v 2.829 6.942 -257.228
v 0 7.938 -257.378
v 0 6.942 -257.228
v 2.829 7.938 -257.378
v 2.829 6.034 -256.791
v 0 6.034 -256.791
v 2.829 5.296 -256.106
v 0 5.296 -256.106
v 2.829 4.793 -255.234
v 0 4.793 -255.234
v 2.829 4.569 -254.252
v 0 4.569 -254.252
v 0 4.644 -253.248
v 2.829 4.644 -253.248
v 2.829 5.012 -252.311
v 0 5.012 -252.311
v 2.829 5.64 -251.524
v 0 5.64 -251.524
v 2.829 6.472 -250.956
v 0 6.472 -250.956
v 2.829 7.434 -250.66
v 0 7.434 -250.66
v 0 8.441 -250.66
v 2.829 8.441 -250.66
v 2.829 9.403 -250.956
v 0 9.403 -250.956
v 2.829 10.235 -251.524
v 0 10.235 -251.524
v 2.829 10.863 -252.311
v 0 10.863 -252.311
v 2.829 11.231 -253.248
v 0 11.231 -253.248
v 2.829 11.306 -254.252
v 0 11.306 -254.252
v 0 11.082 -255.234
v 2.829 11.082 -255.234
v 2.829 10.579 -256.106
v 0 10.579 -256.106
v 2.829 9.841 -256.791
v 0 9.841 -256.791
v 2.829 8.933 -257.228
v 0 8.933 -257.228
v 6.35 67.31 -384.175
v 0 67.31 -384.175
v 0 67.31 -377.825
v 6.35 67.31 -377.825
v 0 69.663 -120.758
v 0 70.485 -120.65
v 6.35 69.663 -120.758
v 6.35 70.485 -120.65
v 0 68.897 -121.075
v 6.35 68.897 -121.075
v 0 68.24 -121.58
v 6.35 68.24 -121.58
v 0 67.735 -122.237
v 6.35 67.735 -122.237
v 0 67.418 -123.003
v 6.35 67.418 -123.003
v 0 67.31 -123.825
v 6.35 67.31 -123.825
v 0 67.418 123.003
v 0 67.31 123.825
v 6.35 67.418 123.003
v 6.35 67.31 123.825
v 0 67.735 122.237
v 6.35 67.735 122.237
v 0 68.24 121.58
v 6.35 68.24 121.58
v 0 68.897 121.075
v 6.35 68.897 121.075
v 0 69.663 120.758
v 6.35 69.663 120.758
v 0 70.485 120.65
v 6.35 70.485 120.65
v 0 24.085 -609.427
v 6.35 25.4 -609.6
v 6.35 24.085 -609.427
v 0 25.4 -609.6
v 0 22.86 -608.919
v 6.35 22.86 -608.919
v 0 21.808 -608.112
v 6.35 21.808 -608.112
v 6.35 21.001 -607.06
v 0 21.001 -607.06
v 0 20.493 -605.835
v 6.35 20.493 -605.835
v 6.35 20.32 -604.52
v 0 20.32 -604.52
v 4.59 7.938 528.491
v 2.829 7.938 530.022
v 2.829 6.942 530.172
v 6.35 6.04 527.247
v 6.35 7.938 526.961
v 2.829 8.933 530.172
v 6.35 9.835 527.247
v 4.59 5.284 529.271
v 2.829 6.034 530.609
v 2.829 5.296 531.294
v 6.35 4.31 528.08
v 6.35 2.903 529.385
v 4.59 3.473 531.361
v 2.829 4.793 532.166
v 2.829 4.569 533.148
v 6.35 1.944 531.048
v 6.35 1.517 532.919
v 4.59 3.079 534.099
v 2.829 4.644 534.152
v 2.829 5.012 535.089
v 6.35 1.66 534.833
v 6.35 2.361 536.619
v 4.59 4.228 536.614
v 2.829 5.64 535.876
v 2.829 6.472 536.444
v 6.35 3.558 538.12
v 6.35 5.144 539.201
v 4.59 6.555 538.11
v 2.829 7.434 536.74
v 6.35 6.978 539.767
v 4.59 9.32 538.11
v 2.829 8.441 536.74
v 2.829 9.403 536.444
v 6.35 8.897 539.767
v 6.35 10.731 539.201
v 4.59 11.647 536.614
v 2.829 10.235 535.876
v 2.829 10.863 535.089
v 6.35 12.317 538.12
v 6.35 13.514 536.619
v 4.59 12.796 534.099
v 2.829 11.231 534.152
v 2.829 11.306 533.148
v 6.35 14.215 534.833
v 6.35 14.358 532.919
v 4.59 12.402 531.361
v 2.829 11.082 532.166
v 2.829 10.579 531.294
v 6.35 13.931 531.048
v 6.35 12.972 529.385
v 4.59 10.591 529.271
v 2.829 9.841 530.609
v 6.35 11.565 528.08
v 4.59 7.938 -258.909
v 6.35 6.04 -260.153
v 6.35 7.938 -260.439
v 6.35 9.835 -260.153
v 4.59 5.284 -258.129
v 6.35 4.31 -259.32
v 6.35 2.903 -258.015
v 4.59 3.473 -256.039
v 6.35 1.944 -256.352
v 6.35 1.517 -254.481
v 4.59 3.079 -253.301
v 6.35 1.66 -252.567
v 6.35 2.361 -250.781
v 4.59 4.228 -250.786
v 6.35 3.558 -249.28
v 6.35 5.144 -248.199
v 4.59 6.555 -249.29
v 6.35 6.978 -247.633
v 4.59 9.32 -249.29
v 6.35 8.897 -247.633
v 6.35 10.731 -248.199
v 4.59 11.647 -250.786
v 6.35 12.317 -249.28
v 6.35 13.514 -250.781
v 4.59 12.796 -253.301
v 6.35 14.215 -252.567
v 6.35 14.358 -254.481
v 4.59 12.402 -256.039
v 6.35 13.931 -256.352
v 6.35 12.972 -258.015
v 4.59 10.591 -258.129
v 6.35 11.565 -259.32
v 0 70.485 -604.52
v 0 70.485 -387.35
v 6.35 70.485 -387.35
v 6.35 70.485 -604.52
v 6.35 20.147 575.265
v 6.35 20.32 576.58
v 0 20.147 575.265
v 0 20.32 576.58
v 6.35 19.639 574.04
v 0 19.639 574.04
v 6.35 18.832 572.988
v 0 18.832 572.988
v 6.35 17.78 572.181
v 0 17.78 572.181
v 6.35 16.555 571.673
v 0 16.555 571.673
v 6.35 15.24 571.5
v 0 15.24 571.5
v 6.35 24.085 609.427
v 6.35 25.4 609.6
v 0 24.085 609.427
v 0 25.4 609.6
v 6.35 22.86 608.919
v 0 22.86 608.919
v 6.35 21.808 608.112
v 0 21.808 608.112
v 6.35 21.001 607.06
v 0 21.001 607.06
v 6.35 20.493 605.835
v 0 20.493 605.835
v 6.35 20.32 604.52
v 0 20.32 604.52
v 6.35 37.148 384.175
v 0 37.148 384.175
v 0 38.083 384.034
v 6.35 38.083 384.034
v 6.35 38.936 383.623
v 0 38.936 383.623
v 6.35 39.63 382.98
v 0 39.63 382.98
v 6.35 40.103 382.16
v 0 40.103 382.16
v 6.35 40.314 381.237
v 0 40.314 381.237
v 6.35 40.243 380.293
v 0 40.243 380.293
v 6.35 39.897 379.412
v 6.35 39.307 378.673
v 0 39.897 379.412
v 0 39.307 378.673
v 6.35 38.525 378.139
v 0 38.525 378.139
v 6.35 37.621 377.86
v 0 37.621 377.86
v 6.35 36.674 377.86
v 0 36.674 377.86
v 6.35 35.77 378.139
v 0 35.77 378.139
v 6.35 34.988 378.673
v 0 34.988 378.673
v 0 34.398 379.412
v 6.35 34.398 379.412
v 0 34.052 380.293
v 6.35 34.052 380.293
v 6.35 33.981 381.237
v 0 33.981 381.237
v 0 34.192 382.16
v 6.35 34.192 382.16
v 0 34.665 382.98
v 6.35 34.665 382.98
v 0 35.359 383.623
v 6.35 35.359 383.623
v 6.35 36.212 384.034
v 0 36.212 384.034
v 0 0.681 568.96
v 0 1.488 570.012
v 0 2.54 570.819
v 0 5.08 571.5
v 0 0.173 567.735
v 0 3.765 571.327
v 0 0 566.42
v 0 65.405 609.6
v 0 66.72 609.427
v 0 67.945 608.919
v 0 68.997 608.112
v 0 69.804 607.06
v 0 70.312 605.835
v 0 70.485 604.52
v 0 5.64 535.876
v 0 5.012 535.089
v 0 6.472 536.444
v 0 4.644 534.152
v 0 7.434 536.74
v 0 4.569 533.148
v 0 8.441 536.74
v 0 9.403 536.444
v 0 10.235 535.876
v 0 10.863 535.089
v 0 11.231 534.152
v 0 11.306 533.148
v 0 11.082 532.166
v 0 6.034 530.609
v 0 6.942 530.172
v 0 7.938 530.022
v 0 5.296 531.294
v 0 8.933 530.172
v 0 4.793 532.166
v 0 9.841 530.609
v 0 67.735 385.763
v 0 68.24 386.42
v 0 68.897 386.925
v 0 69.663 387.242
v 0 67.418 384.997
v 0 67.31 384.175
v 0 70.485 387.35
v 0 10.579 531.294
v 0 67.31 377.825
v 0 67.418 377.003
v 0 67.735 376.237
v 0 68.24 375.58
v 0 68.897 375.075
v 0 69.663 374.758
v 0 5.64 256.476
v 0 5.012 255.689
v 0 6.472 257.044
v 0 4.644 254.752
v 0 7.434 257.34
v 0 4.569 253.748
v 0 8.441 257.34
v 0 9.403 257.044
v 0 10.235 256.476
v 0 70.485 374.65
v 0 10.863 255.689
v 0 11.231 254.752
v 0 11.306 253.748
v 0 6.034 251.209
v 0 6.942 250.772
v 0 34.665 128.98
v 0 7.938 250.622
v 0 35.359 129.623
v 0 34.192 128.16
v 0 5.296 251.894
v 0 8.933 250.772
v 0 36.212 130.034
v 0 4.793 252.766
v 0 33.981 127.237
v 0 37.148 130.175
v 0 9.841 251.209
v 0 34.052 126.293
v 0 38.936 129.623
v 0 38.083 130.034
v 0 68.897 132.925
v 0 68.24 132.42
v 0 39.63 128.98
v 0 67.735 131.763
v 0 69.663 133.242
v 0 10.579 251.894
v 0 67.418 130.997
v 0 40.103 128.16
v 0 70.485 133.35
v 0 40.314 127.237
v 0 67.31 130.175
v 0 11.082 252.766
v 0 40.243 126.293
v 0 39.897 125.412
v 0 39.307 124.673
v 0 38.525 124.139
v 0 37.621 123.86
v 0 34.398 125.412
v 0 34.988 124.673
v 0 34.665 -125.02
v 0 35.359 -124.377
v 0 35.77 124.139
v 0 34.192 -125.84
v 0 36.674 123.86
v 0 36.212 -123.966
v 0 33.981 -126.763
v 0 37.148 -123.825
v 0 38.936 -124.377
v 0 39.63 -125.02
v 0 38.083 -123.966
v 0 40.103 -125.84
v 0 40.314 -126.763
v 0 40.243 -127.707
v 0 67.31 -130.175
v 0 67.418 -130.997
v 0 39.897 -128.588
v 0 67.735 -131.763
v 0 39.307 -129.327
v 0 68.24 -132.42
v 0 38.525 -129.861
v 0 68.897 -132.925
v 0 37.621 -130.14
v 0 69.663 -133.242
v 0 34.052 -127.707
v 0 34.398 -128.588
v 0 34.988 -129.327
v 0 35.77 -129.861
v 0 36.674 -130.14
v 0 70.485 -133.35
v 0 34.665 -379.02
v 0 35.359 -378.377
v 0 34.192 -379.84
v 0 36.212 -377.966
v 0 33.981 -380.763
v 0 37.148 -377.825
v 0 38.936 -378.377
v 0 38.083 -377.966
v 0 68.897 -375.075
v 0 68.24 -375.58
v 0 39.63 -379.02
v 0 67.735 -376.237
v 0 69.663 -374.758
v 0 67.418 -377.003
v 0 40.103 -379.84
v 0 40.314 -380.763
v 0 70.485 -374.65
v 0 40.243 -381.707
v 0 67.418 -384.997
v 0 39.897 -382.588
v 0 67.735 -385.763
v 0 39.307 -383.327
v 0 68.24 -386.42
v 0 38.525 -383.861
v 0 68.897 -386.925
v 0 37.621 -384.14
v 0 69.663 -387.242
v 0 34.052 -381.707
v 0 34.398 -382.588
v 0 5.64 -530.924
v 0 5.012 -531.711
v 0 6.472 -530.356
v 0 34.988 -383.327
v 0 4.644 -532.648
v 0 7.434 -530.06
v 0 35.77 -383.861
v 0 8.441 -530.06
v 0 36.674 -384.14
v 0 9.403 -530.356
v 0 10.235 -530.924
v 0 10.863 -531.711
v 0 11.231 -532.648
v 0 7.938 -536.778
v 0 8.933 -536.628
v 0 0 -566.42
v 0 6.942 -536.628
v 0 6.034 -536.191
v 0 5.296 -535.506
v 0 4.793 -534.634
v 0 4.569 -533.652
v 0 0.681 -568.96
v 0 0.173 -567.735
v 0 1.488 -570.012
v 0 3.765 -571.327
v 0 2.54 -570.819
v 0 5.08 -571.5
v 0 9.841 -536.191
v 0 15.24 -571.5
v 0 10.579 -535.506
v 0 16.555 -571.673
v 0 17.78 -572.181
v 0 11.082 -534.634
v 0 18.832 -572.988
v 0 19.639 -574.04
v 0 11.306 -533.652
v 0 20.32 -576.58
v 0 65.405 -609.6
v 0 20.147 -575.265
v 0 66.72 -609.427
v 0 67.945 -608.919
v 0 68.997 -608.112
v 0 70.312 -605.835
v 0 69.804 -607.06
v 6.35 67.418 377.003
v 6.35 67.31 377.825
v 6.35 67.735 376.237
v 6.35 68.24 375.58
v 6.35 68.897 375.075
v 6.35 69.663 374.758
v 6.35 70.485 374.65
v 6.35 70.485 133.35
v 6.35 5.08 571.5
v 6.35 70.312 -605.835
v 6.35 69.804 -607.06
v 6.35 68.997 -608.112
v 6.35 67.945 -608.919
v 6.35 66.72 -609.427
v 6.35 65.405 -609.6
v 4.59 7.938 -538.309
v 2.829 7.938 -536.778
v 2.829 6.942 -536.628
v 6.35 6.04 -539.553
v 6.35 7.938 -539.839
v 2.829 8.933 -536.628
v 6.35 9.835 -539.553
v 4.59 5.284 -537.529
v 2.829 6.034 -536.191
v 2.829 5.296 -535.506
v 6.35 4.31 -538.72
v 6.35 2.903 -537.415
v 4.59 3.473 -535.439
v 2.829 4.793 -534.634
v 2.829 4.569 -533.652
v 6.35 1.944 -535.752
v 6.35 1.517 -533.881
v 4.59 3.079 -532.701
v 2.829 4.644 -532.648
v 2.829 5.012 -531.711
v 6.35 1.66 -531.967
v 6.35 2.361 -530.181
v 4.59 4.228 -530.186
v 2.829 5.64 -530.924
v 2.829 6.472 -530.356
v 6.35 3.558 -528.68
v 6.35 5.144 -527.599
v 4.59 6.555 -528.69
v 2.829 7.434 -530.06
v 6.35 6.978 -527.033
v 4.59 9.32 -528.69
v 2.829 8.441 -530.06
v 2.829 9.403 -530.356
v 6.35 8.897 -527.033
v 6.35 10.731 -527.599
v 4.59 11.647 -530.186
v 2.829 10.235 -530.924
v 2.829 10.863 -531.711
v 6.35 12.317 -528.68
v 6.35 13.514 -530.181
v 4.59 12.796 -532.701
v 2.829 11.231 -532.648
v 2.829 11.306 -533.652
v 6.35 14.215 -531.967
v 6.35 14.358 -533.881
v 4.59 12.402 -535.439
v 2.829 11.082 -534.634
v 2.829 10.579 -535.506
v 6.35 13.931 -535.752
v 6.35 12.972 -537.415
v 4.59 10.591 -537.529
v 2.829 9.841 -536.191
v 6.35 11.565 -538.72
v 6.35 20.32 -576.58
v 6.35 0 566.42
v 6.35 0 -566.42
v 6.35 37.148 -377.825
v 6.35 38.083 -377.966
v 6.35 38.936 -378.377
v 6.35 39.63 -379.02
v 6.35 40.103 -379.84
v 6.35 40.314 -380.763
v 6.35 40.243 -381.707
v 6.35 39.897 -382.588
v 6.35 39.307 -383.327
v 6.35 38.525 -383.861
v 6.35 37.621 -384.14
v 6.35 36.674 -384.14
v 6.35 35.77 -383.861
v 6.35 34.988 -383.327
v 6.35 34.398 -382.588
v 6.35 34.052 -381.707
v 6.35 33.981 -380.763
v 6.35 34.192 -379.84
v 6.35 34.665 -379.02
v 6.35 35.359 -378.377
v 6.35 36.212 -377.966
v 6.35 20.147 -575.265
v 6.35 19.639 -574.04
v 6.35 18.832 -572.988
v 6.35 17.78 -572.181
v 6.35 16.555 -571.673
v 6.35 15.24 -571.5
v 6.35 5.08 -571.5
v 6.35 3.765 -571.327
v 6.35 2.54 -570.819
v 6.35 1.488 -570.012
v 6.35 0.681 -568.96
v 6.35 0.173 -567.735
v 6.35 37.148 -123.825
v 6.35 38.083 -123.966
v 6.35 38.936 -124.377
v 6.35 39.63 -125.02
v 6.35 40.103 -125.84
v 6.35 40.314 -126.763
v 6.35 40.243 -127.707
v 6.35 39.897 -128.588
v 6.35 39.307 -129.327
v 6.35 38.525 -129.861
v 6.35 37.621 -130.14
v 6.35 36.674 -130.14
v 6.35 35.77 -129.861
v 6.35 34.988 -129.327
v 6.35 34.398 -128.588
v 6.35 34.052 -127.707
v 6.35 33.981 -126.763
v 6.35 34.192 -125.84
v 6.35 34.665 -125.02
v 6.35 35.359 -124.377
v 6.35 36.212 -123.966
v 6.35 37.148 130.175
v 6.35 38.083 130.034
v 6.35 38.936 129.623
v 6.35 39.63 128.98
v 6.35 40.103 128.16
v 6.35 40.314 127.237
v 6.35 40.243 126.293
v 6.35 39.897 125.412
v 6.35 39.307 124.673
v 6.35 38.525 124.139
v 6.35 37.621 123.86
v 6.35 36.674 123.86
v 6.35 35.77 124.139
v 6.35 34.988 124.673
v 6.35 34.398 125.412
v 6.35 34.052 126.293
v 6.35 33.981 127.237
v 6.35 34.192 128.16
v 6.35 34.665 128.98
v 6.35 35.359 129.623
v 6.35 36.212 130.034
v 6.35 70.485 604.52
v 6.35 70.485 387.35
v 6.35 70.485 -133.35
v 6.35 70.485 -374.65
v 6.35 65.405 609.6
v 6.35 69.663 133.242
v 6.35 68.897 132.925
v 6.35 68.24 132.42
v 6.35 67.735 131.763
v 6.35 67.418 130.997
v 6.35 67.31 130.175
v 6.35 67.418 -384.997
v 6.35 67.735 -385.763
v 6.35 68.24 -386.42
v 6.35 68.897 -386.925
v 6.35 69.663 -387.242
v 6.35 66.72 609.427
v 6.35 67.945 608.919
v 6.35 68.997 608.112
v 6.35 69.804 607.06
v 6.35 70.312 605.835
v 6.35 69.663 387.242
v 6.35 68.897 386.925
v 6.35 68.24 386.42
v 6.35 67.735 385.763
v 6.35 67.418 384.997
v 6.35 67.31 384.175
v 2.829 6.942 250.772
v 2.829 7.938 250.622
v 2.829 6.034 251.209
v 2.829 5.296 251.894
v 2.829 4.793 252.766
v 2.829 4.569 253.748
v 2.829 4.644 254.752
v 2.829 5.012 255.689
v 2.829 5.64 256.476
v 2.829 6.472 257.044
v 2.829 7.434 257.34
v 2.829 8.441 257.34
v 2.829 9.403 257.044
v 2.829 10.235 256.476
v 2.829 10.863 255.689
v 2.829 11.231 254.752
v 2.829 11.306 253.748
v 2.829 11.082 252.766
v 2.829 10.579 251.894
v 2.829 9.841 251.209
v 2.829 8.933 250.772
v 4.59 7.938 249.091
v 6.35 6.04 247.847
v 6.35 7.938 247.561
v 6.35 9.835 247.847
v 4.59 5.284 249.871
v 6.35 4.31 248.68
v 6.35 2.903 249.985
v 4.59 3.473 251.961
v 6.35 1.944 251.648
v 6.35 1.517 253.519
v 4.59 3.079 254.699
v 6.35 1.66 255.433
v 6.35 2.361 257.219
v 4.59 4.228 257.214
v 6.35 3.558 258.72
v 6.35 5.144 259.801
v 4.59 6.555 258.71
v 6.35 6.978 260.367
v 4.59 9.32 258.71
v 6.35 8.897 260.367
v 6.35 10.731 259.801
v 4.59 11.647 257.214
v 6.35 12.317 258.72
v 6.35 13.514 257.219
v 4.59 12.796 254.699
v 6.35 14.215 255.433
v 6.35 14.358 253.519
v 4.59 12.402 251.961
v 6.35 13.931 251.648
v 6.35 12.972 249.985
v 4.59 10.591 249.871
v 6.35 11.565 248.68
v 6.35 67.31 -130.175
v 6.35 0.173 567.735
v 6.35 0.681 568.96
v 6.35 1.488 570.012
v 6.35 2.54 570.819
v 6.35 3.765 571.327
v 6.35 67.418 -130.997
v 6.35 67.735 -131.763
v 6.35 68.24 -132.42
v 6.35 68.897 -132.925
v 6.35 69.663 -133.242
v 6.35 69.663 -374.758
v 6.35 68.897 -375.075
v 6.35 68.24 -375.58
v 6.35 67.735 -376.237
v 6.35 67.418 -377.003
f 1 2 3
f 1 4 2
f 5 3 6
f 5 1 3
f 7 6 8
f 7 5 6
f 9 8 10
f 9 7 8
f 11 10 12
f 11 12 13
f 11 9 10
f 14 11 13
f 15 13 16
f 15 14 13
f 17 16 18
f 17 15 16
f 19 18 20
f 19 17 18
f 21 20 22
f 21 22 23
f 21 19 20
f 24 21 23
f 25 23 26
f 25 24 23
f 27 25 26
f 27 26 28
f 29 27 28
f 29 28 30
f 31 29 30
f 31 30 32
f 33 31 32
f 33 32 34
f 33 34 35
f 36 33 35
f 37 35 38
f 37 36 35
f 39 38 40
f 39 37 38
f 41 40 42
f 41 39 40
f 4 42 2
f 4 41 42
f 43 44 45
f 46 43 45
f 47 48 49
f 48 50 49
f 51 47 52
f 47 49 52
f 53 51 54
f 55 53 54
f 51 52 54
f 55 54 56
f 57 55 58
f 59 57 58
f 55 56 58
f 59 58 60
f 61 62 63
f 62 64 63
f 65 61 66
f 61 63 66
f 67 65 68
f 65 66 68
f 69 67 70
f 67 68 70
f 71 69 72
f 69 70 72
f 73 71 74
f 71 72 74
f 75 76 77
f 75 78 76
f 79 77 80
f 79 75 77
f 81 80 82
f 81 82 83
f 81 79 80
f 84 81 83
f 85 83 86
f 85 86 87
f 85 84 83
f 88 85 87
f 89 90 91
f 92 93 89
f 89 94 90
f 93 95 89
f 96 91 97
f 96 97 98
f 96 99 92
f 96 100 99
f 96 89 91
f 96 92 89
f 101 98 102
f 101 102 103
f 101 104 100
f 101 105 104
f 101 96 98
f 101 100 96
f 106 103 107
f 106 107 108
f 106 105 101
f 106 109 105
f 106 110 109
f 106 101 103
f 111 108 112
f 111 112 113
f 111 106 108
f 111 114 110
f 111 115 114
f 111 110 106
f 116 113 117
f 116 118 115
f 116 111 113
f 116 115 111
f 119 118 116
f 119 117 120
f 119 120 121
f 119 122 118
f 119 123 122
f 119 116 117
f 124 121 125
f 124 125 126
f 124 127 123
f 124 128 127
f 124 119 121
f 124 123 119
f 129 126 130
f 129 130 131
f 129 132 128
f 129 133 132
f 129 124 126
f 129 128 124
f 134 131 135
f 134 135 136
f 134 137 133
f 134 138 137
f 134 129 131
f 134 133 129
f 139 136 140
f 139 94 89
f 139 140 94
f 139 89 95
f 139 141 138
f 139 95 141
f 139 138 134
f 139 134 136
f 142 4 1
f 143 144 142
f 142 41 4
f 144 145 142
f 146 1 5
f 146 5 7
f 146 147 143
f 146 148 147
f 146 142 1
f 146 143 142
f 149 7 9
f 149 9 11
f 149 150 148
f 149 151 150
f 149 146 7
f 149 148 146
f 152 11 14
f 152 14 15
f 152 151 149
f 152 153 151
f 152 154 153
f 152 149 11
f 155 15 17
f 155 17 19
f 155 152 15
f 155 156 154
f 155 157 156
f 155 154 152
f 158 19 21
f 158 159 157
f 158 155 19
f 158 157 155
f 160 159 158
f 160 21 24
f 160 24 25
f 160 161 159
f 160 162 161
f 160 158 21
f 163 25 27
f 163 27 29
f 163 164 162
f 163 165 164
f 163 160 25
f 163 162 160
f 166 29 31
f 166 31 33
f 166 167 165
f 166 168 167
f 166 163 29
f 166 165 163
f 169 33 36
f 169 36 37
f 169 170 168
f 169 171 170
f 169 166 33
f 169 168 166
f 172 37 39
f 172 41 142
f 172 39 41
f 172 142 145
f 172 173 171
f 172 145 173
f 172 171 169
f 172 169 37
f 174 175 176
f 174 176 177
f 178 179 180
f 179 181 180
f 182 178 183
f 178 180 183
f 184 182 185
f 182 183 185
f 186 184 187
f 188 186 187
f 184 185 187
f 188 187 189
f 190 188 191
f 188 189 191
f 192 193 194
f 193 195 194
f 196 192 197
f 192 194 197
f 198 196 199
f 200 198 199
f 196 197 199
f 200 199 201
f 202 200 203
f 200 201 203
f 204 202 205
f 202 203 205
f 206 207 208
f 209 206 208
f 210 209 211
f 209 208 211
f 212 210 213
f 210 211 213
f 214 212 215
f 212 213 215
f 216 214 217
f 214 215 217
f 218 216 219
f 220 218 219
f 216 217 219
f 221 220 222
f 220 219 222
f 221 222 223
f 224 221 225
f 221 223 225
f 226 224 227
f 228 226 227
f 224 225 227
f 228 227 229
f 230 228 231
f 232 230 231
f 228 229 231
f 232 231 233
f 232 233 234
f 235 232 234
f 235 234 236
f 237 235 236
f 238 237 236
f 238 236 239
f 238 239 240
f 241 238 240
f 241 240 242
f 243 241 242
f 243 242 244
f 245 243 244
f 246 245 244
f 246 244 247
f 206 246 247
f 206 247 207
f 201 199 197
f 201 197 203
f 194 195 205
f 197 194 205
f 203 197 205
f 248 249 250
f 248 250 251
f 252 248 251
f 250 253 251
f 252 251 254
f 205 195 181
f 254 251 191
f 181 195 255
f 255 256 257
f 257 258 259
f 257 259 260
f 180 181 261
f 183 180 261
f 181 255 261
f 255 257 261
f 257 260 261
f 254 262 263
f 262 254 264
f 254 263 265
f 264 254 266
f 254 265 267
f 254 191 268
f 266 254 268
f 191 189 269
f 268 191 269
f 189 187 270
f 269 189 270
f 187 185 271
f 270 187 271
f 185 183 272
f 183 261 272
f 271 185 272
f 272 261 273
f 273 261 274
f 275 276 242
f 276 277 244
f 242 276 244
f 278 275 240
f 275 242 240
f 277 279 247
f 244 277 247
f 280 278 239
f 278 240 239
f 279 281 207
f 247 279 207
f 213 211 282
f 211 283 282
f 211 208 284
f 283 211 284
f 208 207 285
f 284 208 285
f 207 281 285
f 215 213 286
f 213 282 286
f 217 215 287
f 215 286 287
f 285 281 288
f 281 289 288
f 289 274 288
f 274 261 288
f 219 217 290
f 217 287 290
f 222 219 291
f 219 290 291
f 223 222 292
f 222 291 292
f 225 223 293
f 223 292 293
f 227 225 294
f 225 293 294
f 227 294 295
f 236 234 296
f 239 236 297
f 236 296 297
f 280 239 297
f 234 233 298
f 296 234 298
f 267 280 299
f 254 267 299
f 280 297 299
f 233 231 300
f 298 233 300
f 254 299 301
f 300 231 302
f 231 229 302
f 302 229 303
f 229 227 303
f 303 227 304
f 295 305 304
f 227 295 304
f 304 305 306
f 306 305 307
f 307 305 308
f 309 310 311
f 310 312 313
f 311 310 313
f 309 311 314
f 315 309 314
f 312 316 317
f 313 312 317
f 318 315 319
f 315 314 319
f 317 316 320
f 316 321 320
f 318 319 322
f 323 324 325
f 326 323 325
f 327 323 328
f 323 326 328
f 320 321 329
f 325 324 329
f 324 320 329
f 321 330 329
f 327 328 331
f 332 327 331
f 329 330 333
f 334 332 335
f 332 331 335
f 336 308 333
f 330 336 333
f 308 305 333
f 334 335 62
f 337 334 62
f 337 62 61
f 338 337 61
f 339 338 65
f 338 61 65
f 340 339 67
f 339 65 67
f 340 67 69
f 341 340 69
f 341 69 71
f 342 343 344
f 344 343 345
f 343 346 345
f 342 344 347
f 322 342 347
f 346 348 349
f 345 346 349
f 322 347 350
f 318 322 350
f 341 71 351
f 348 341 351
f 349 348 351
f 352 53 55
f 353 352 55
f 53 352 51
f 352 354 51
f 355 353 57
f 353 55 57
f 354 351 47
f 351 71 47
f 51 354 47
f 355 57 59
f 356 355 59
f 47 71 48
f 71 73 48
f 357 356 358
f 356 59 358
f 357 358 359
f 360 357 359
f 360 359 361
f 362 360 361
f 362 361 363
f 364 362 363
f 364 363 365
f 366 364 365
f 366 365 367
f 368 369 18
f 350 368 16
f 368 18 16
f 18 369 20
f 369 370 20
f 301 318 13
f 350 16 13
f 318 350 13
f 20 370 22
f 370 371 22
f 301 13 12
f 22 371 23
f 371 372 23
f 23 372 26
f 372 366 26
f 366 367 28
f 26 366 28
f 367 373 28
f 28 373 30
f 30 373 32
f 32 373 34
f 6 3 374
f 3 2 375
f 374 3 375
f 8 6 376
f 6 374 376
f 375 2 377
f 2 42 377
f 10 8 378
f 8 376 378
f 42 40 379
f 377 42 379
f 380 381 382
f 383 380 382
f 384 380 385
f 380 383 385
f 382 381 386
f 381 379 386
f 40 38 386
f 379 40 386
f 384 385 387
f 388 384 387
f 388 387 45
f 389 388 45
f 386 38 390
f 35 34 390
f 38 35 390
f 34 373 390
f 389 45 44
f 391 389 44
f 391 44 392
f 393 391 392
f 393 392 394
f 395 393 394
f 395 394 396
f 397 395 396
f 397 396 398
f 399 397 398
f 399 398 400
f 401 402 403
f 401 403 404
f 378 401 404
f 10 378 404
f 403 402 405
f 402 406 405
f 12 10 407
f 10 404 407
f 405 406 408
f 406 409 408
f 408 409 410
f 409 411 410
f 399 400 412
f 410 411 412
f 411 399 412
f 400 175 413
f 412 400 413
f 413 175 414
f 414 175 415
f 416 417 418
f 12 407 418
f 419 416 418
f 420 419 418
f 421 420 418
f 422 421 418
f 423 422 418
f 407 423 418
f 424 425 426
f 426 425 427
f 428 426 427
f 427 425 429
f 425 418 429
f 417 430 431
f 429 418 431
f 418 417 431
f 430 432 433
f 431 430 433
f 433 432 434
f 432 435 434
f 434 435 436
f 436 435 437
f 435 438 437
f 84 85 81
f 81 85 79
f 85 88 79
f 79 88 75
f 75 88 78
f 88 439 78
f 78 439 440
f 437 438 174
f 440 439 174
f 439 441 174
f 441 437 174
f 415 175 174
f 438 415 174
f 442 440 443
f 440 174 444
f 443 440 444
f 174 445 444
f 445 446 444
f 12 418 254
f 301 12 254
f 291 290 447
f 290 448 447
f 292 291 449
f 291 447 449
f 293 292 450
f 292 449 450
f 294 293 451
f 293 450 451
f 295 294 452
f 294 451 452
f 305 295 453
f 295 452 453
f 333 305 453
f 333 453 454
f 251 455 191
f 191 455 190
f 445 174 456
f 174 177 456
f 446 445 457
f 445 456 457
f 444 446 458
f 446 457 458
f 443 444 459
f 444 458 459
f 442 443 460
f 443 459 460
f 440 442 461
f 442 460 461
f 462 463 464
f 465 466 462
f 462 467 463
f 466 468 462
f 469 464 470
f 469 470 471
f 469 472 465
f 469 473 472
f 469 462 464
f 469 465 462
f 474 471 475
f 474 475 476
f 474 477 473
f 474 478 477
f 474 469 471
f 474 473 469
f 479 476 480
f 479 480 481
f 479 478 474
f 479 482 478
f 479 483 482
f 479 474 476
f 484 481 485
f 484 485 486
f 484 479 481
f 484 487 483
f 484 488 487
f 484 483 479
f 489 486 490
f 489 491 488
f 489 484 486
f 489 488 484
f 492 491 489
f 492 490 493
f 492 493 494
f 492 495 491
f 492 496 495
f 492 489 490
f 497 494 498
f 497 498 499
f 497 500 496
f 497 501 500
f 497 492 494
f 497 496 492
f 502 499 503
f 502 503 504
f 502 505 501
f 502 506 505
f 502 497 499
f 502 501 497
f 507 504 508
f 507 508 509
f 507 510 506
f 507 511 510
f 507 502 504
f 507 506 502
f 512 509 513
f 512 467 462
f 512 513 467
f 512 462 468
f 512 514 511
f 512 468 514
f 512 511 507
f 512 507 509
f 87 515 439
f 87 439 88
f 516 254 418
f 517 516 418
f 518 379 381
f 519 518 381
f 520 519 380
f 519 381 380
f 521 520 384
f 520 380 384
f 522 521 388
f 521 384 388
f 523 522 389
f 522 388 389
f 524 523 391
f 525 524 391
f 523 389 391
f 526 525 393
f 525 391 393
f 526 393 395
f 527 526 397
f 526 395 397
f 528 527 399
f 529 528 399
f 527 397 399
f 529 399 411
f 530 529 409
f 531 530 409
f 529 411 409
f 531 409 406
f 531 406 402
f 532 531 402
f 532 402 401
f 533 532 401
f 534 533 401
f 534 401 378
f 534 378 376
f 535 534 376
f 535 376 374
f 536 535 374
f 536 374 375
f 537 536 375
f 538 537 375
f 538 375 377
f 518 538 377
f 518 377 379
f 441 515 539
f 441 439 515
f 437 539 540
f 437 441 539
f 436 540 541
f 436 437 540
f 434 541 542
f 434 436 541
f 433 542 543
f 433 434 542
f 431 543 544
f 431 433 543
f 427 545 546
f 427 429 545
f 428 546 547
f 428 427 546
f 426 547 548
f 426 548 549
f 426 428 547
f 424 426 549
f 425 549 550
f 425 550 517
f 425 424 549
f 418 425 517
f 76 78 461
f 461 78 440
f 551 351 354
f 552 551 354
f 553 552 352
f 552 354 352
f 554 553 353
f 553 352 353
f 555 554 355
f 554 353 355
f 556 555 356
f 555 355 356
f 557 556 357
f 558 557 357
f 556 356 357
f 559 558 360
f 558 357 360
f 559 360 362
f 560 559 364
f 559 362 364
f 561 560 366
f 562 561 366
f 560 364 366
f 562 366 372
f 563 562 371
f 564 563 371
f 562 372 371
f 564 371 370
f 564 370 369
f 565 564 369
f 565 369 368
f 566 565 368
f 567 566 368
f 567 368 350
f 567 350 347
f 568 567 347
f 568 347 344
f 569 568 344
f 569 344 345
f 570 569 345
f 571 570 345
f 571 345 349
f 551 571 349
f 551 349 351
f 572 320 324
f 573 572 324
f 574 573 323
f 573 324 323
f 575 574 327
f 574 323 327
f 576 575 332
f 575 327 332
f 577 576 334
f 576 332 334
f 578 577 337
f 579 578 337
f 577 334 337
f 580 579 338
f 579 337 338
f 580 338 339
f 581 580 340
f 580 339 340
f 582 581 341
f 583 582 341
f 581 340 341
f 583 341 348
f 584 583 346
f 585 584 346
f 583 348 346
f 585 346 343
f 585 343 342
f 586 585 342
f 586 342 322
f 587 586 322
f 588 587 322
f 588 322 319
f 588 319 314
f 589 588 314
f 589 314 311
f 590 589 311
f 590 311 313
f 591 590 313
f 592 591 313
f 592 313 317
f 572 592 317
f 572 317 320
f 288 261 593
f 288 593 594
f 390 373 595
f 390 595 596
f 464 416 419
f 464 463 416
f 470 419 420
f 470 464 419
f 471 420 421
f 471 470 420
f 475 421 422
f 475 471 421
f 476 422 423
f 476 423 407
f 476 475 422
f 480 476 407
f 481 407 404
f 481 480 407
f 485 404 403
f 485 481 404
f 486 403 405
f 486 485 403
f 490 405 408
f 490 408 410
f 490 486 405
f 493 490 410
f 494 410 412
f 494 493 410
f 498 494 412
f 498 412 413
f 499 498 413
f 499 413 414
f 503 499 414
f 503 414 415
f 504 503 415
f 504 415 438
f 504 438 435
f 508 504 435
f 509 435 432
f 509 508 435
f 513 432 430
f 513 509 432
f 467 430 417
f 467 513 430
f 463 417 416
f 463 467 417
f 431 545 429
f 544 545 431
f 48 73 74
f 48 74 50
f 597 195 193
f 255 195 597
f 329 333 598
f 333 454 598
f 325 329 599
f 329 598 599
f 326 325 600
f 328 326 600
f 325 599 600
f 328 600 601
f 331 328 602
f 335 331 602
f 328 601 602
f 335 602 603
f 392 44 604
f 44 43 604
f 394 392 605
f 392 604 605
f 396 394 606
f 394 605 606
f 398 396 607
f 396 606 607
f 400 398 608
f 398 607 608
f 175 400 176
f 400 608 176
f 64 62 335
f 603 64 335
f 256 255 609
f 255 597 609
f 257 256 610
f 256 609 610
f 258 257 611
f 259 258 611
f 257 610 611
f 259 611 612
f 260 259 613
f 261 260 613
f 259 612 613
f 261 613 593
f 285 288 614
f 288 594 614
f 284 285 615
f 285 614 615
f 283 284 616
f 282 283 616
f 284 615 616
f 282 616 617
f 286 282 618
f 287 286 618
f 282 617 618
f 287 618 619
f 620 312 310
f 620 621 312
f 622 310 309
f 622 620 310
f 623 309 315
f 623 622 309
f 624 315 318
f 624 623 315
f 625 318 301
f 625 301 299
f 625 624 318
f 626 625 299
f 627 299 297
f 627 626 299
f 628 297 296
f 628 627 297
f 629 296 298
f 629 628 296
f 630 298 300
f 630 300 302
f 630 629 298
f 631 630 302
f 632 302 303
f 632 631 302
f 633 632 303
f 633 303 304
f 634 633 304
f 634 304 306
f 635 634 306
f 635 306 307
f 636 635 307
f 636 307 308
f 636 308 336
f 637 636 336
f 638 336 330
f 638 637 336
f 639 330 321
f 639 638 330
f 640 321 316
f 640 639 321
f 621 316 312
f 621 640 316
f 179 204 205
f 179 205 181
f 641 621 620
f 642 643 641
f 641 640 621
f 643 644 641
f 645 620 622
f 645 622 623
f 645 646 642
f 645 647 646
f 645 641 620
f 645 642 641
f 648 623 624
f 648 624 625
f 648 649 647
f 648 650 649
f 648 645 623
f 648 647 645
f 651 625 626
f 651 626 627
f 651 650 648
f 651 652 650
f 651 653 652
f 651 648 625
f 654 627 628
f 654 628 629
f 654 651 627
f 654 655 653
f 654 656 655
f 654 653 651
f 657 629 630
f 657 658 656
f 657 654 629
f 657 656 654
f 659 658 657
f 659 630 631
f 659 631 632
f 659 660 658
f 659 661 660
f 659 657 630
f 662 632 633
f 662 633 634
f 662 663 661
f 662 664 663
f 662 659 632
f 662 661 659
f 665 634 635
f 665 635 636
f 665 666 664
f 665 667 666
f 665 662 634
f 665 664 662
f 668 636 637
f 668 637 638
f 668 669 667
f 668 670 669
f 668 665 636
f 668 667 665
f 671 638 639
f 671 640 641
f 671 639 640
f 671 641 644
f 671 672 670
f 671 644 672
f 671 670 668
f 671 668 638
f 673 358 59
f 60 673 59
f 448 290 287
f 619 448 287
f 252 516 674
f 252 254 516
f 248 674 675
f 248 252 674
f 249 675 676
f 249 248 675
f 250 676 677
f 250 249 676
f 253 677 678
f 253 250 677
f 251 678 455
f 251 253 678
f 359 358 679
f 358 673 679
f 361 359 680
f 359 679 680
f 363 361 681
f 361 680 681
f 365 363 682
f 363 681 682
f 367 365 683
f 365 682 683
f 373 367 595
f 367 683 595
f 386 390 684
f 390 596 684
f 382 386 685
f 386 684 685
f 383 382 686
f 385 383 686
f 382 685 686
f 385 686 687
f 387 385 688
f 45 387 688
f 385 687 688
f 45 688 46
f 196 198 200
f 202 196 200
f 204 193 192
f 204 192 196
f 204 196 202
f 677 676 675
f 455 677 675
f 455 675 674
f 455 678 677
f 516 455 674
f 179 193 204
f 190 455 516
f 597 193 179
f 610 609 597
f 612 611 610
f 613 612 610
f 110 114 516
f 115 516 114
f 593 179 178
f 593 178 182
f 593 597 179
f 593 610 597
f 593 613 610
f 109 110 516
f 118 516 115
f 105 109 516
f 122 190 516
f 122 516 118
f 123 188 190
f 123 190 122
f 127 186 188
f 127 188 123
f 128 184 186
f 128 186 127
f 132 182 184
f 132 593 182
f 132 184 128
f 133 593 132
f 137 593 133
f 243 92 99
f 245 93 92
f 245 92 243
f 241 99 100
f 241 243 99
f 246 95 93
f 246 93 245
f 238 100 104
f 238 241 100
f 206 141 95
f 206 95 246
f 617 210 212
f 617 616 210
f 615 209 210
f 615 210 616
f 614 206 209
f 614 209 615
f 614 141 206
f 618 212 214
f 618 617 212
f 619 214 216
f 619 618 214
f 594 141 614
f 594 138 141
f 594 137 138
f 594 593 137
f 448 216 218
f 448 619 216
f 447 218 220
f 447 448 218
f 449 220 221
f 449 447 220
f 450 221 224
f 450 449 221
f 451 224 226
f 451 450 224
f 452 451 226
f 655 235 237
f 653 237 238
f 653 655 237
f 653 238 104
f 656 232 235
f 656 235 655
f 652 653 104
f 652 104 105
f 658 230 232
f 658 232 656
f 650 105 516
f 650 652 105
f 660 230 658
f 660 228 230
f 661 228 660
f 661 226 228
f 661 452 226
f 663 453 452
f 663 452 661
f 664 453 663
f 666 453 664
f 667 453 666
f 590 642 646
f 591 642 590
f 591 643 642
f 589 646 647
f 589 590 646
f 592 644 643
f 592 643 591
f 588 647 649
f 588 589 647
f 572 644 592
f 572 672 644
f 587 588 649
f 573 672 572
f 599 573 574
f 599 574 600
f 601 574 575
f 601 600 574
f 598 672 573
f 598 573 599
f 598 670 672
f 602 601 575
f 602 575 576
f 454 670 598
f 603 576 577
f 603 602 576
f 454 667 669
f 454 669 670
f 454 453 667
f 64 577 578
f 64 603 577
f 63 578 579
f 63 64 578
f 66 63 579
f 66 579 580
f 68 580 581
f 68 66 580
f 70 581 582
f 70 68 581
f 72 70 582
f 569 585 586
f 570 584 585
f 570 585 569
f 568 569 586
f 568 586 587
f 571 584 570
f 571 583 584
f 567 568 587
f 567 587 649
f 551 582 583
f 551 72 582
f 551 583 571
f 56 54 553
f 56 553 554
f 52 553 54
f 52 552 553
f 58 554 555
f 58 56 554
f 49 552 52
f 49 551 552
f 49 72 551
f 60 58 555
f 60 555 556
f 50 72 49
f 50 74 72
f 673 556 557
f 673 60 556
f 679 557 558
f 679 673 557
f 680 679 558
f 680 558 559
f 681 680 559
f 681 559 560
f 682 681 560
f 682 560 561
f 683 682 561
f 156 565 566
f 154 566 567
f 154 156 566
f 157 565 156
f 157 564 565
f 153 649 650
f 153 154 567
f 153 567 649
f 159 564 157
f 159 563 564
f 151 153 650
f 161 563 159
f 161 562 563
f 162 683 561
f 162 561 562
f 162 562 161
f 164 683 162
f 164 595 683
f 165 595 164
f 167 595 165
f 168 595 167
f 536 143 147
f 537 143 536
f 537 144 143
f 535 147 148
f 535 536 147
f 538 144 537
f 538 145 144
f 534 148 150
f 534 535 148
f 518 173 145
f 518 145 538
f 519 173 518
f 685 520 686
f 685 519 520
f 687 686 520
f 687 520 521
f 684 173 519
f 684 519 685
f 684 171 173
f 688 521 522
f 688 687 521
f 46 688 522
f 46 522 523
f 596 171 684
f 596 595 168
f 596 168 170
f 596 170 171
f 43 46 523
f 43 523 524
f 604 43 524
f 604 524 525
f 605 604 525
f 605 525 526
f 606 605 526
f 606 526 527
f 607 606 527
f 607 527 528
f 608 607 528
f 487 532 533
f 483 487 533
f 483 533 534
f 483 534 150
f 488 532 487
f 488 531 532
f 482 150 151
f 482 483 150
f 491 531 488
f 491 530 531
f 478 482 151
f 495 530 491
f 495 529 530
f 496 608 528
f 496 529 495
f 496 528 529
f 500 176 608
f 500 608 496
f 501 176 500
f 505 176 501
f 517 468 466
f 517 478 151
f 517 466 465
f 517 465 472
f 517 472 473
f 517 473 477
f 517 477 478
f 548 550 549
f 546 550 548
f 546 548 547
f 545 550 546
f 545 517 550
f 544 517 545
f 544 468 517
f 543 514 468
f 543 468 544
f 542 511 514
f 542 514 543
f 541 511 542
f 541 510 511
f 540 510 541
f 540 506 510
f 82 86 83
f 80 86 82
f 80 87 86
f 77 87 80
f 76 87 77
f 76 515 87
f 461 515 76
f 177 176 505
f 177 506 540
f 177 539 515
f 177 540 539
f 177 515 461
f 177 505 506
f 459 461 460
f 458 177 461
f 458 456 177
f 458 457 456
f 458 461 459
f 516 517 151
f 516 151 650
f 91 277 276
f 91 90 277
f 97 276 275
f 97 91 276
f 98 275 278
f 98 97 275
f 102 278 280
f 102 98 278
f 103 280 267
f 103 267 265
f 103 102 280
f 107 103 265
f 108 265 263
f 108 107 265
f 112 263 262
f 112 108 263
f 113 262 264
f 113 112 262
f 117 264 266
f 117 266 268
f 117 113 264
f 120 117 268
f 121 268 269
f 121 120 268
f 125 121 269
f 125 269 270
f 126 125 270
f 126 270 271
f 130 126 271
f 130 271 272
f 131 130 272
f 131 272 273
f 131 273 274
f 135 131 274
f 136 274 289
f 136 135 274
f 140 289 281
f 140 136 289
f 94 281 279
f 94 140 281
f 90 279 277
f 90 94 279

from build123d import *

# Parameters (mm, degrees)
SKETCH1_W                                     = 1219.2
SKETCH1_H                                     = 70.485
BOSS_EXTRUDE1_DEPTH                           = 6.35
CSK_FOR_1_4_FLAT_HEAD_MACHINE_SCREW1_AT_COUNT = 2
CSK_FOR_1_4_FLAT_HEAD_MACHINE_SCREW1_AT_PITCH = 279.4
CSK_FOR_1_4_FLAT_HEAD_MACHINE_SCREW1_2_COUNT  = 2
CSK_FOR_1_4_FLAT_HEAD_MACHINE_SCREW1_2_PITCH  = 787.4
CSK_FOR_1_4_FLAT_HEAD_MACHINE_SCREW1_3_COUNT  = 2
CSK_FOR_1_4_FLAT_HEAD_MACHINE_SCREW1_3_PITCH  = 1066.8
SKETCH4_W                                     = 38.1
SKETCH4_H                                     = 20.32
CUT_EXTRUDE1_DEPTH                            = 614.694237976
FILLET1_R                                     = 5.08
F_1_4_0_25_DIAMETER_HOLE1_D                   = 6.35
SKETCH7_W                                     = 12.7
SKETCH7_H                                     = 3.175
CUT_EXTRUDE2_DEPTH                            = 614.694237976
FILLET2_R                                     = 3.175


with BuildPart() as part:
    # Sketch1 → Boss-Extrude1 (new body)
    with BuildSketch(Plane(origin=(0, 0, 0), x_dir=(0, 0, -1), z_dir=(1, 0, 0))):
        with Locations((0, 35.2425)):
            Rectangle(SKETCH1_W, SKETCH1_H)
    extrude(amount=BOSS_EXTRUDE1_DEPTH)

    # Sketch3 → CSK for 1/4 Flat Head Machine Screw1 (revolve, cut)
    with BuildSketch(Plane(origin=(6.35, 7.9375, 533.4), x_dir=(0, 0, -1), z_dir=(0, 1, 0))):
        Polygon((0, 0), (0, 6.35), (3.3782, 6.35), (3.3782, 3.520932584), (6.4389, 0), align=None)
    csk_for_1_4_flat_head_machine_screw1 = revolve(axis=Axis((12.7, 7.9375, 533.4), (-1, 0, 0)), mode=Mode.SUBTRACT)

    # CSK for 1/4 Flat Head Machine Screw1 at: CSK for 1/4 Flat Head Machine Screw1 ×2
    with Locations(*[(0, 0, -i * CSK_FOR_1_4_FLAT_HEAD_MACHINE_SCREW1_AT_PITCH) for i in range(1, CSK_FOR_1_4_FLAT_HEAD_MACHINE_SCREW1_AT_COUNT)]):
        add(csk_for_1_4_flat_head_machine_screw1, mode=Mode.SUBTRACT)

    # CSK for 1_4 Flat Head Machine Screw1 2: CSK for 1/4 Flat Head Machine Screw1 ×2
    with Locations(*[(0, 0, -i * CSK_FOR_1_4_FLAT_HEAD_MACHINE_SCREW1_2_PITCH) for i in range(1, CSK_FOR_1_4_FLAT_HEAD_MACHINE_SCREW1_2_COUNT)]):
        add(csk_for_1_4_flat_head_machine_screw1, mode=Mode.SUBTRACT)

    # CSK for 1_4 Flat Head Machine Screw1 3: CSK for 1/4 Flat Head Machine Screw1 ×2
    with Locations(*[(0, 0, -i * CSK_FOR_1_4_FLAT_HEAD_MACHINE_SCREW1_3_PITCH) for i in range(1, CSK_FOR_1_4_FLAT_HEAD_MACHINE_SCREW1_3_COUNT)]):
        add(csk_for_1_4_flat_head_machine_screw1, mode=Mode.SUBTRACT)

    # Sketch4 → Cut-Extrude1 (cut, through all)
    with BuildSketch(Plane(origin=(6.35, 0, 0), x_dir=(0, 0, -1), z_dir=(1, 0, 0))):
        with Locations((-590.55, 10.16)):
            Rectangle(SKETCH4_W, SKETCH4_H)
        with Locations((590.55, 10.16)):
            Rectangle(SKETCH4_W, SKETCH4_H)
    extrude(amount=-CUT_EXTRUDE1_DEPTH, mode=Mode.SUBTRACT)

    # Fillet1
    fillet1_edges = [part.edges().sort_by_distance(p)[0] for p in [
        (3.175, 20.32, 609.6),
        (3.175, 20.32, 571.5),
        (3.175, 0, 571.5),
        (3.175, 0, -571.5),
        (3.175, 20.32, -571.5),
        (3.175, 20.32, -609.6),
        (3.175, 70.485, 609.6),
        (3.175, 70.485, -609.6),
    ]]
    fillet(fillet1_edges, radius=FILLET1_R)

    # 1/4 (0.25) Diameter Hole1 (through all)
    with Locations(Plane(origin=(6.35, 0, 0), x_dir=(0, 0, -1), z_dir=(1, 0, 0))):
        with Locations((-381, 37.1475), (-127, 37.1475), (127, 37.1475), (381, 37.1475)):
            Hole(F_1_4_0_25_DIAMETER_HOLE1_D / 2)

    # Sketch7 → Cut-Extrude2 (cut, through all)
    with BuildSketch(Plane.ZY):
        with Locations((-381, 68.8975)):
            Rectangle(SKETCH7_W, SKETCH7_H)
        with Locations((-127, 68.8975)):
            Rectangle(SKETCH7_W, SKETCH7_H)
        with Locations((127, 68.8975)):
            Rectangle(SKETCH7_W, SKETCH7_H)
        with Locations((381, 68.8975)):
            Rectangle(SKETCH7_W, SKETCH7_H)
    extrude(amount=-CUT_EXTRUDE2_DEPTH, mode=Mode.SUBTRACT)

    # Fillet2
    fillet2_edges = [part.edges().sort_by_distance(p)[0] for p in [
        (3.175, 67.31, 374.65),
        (3.175, 67.31, 387.35),
        (3.175, 67.31, 133.35),
        (3.175, 67.31, 120.65),
        (3.175, 67.31, -133.35),
        (3.175, 67.31, -120.65),
        (3.175, 67.31, -374.65),
        (3.175, 67.31, -387.35),
    ]]
    fillet(fillet2_edges, radius=FILLET2_R - 0.0001)  # a hair under: the kernel refuses the full size


solid = part.part
